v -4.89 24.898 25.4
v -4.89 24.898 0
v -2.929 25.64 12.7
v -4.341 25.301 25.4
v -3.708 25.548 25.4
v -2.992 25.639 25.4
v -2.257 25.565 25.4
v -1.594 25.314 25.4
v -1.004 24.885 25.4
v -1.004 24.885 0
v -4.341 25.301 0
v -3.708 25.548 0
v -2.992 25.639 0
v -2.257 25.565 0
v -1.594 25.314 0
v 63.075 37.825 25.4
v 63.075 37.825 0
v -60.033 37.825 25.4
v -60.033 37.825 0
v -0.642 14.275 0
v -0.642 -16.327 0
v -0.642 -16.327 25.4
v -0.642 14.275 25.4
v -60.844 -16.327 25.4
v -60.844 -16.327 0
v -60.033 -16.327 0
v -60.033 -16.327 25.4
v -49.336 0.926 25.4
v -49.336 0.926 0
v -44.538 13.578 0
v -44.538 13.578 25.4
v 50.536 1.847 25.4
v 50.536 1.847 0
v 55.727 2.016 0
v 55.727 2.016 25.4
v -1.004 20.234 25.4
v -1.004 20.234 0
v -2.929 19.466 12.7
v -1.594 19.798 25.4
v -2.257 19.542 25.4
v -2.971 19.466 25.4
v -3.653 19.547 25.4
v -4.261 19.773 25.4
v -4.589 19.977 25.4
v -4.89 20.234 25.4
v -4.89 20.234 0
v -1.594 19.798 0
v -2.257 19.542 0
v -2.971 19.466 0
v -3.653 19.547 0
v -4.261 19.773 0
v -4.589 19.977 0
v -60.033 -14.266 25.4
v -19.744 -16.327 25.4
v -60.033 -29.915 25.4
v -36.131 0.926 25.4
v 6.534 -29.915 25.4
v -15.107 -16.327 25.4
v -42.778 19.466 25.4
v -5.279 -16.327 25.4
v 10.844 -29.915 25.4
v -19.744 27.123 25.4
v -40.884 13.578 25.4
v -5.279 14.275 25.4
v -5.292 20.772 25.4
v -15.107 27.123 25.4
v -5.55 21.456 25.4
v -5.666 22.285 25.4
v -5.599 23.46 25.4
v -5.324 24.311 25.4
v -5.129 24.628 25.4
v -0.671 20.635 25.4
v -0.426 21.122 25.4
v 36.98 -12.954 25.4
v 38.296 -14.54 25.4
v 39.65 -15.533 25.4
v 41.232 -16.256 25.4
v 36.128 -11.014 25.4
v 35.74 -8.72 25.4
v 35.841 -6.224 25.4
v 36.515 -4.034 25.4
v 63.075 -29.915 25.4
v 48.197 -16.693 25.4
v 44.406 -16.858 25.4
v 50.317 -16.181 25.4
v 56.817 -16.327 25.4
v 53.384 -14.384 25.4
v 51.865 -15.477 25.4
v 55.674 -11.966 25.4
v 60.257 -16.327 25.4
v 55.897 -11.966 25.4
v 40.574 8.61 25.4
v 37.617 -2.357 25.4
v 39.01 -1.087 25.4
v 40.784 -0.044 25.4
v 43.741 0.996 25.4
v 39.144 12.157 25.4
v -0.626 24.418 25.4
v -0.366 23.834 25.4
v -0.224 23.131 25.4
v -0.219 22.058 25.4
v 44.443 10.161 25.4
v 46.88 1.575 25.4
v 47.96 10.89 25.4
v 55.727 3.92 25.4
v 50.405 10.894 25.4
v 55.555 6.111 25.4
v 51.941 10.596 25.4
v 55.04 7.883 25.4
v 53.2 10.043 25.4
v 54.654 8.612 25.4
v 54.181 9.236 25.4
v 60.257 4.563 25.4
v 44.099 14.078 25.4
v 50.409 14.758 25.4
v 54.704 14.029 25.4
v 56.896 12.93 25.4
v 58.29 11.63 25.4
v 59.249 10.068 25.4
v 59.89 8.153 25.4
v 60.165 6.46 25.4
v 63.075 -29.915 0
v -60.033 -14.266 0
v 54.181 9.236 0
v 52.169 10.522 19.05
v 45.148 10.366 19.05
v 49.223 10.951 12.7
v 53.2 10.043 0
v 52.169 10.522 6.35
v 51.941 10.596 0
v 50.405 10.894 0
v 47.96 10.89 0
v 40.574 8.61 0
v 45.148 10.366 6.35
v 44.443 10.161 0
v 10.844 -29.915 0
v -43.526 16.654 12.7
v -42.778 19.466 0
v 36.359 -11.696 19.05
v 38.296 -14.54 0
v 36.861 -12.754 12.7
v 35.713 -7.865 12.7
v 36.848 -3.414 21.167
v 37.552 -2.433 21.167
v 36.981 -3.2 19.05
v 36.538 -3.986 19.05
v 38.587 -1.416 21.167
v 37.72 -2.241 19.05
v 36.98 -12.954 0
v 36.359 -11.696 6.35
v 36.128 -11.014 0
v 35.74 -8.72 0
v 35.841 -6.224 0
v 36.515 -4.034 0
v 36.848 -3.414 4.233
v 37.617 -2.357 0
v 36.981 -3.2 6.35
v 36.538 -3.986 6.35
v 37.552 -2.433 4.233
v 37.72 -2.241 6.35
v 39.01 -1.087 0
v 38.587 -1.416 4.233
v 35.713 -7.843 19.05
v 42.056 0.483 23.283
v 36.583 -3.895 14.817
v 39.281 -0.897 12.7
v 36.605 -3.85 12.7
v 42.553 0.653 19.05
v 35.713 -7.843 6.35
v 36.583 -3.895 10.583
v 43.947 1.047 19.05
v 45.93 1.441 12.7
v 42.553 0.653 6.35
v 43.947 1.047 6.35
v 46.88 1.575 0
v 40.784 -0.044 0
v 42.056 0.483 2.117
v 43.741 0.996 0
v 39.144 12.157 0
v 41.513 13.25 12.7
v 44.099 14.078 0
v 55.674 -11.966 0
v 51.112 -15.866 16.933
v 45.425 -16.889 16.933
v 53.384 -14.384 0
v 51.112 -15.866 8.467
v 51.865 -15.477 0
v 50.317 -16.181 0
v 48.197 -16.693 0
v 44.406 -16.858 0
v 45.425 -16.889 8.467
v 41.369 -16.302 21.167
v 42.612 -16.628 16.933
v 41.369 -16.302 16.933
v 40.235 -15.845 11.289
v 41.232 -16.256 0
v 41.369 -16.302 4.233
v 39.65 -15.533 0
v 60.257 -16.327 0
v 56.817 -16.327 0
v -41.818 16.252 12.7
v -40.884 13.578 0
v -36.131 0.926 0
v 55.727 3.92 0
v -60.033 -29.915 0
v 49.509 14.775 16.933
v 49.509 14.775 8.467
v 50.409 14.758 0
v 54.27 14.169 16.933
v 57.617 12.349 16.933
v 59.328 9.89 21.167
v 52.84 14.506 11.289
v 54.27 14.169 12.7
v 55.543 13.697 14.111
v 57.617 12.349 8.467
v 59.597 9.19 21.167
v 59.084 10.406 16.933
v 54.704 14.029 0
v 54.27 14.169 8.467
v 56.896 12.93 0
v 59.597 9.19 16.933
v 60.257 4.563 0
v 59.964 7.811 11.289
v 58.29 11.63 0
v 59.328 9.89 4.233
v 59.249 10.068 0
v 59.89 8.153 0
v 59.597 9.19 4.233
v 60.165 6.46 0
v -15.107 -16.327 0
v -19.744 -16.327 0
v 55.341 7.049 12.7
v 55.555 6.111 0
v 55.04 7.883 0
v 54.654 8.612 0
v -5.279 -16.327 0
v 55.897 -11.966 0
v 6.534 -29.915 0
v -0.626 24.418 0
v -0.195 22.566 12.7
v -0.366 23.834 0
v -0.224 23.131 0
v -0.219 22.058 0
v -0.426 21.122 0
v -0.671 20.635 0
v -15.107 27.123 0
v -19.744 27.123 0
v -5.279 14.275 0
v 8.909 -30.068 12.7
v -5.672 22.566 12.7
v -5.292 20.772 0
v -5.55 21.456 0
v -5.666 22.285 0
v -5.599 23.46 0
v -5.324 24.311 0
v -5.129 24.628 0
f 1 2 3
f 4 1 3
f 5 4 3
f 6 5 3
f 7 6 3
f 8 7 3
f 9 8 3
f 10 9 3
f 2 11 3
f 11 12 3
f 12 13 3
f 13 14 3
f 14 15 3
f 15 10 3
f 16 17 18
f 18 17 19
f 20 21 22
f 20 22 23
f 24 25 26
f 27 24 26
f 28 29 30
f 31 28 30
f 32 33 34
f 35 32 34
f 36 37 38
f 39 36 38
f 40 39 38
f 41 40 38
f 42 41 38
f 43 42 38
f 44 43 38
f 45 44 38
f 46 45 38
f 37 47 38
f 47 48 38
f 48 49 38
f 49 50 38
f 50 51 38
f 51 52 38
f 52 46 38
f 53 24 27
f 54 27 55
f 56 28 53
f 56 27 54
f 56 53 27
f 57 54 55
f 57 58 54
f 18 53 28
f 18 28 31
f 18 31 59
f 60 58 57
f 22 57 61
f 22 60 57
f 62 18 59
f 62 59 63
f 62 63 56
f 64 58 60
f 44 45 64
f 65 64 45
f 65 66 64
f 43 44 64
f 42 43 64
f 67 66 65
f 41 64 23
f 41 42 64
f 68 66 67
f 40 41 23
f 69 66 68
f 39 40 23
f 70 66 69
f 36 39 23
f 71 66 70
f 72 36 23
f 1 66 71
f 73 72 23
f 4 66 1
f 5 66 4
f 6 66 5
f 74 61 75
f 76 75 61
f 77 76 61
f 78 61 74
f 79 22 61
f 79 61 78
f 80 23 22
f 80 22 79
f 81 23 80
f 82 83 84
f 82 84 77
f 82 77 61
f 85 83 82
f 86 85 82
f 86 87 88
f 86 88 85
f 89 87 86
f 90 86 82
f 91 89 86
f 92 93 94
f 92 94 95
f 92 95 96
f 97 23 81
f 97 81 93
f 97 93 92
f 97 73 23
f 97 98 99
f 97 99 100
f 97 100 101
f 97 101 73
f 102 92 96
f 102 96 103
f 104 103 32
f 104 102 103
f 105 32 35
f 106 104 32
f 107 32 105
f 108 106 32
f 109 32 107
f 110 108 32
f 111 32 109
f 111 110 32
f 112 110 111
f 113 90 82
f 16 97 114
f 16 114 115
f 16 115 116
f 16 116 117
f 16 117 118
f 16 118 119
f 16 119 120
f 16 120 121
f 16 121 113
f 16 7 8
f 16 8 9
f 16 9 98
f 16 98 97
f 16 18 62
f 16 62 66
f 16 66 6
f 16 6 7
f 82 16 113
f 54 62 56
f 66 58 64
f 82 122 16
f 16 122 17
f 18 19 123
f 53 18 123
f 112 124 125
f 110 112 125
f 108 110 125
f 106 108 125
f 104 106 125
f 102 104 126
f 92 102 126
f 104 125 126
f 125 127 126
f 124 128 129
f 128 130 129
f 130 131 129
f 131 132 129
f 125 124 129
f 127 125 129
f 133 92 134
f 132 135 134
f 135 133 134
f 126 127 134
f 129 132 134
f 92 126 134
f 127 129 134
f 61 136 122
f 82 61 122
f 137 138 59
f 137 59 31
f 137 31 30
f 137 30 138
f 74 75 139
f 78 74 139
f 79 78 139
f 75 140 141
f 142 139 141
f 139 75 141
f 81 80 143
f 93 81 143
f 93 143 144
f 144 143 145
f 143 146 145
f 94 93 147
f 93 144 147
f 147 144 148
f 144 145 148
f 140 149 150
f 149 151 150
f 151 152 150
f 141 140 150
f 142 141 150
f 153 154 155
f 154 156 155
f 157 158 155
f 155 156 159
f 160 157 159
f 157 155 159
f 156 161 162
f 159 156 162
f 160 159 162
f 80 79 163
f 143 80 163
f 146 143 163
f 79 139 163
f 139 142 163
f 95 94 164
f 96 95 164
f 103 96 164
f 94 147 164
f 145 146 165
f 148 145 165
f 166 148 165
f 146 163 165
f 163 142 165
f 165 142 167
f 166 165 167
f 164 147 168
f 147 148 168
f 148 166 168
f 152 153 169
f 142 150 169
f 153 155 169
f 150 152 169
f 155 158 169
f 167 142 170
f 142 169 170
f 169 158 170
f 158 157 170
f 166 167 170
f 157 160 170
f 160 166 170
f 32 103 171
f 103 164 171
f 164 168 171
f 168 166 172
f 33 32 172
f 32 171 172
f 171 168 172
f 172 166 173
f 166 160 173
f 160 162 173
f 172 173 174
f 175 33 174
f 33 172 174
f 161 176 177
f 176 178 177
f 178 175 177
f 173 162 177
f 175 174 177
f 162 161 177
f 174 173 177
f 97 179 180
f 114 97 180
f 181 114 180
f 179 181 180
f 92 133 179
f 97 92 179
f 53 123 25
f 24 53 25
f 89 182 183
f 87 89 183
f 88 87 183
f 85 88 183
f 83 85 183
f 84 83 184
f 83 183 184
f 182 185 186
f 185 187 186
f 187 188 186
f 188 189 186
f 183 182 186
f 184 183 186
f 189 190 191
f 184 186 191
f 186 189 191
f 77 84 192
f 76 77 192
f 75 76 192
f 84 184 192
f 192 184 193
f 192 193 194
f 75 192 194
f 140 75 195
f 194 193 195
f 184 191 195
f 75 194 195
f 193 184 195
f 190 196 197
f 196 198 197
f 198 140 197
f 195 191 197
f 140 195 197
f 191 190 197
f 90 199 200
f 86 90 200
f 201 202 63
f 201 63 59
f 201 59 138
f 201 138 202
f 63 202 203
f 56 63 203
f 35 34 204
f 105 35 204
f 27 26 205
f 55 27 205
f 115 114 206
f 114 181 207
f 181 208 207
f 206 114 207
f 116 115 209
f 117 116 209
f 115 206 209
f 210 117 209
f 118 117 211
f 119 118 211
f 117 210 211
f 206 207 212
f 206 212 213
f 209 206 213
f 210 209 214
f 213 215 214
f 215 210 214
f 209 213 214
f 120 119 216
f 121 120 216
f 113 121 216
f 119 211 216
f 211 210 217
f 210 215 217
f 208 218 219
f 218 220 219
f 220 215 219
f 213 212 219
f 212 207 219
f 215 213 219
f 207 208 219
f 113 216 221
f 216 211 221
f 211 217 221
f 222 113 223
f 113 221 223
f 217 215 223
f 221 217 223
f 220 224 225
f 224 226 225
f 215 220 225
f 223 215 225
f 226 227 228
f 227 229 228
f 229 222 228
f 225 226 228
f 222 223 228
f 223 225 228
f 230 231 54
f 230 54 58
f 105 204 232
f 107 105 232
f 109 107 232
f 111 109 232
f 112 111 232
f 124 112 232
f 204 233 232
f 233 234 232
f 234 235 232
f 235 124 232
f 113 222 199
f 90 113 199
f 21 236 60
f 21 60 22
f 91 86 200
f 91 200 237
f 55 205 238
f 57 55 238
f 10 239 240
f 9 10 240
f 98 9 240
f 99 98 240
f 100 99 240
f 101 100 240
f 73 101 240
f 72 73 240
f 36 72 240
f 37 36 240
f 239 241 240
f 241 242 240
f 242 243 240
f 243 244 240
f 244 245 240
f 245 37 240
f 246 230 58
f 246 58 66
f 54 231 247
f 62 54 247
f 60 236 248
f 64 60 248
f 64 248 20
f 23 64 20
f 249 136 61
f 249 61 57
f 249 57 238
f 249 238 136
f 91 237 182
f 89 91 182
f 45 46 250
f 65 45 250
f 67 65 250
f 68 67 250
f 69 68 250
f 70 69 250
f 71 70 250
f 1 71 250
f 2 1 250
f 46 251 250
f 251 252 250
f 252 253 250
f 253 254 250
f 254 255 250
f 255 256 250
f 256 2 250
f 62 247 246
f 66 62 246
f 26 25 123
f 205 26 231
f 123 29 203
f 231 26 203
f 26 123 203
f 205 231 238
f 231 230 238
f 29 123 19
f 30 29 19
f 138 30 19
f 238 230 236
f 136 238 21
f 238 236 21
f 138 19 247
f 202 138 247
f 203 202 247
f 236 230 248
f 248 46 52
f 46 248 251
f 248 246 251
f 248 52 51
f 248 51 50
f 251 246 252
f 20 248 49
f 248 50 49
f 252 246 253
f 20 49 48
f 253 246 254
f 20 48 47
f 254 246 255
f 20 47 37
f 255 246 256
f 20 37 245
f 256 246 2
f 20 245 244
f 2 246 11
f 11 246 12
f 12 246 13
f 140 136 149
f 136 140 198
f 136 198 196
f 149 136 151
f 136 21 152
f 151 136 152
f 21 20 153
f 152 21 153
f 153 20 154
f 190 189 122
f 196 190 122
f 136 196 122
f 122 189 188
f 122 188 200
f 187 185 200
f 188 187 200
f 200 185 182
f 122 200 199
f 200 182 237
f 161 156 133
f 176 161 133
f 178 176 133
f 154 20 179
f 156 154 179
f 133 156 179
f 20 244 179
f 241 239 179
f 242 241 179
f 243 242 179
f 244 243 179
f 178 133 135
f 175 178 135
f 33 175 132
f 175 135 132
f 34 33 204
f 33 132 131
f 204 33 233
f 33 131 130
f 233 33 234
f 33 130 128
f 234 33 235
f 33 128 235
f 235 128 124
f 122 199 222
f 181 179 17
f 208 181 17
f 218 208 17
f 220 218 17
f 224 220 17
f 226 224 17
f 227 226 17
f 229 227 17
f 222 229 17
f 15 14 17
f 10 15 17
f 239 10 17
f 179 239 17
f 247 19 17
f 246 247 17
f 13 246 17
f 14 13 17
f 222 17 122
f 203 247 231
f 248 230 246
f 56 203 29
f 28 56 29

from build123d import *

# Parameters (mm, degrees)
F0_W     = 4.6371185902
F0_H     = 30.6014088084
F0_H_2   = 43.4495331489
F1_DEPTH = 25.4


with BuildPart() as f1:
    # F0 (on Top) → F1 (new body)
    with BuildSketch(Plane.XY):
        with BuildLine():
            Line((63.0750581622, 37.8247536719), (-60.0328557193, 37.8247536719))
            Line((-60.0328557193, 37.8247536719), (-60.0328557193, -14.2655899338))
            Line((-60.0328557193, -14.2655899338), (-44.7080042092, 24.6659818982))
            Line((-44.7080042092, 24.6659818982), (-40.7141853078, 24.6659818982))
            Line((-40.7141853078, 24.6659818982), (-24.658497241, -16.3265038282))
            Line((-24.658497241, -16.3265038282), (-29.5725920862, -16.3265038282))
            Line((-29.5725920862, -16.3265038282), (-34.6564465714, -3.3443587191))
            Line((-34.6564465714, -3.3443587191), (-51.0159150468, -3.3443587191))
            Line((-51.0159150468, -3.3443587191), (-56.0372265067, -16.3265038282))
            Line((-56.0372265067, -16.3265038282), (-60.0328557193, -16.3265038282))
            Line((-60.0328557193, -16.3265038282), (-60.0328557193, -29.9150198698))
            Line((-60.0328557193, -29.9150198698), (6.5335062061, -29.9150198698))
            add(Edge.make_bspline(
                [(6.5335062061, -29.9150198698), (5.6202163906, -29.7963329994), (4.718855215, -29.5856251921)],
                knots=[0.5632770419, 0.5632770419, 0.5632770419, 1, 1, 1], degree=2))
            Line((4.718855215, -29.5856251921), (4.718855215, -25.8777172635))
            add(Edge.make_bspline(
                [(4.718855215, -25.8777172635), (6.2556266938, -26.2083018258), (8.1497868887, -26.2083018258)],
                knots=[0, 0, 0, 1, 1, 1], degree=2))
            add(Edge.make_bspline(
                [(8.1497868887, -26.2083018258), (12.9298609653, -26.2083018258), (14.9669766466, -20.8474710857)],
                knots=[0, 0, 0, 1, 1, 1], degree=2))
            Line((14.9669766466, -20.8474710857), (16.6735077655, -16.4962634683))
            Line((16.6735077655, -16.4962634683), (4.3257276274, 14.2749049802))
            Line((4.3257276274, 14.2749049802), (9.3023654978, 14.2749049802))
            Line((9.3023654978, 14.2749049802), (16.003403923, -3.174599079))
            add(Edge.make_bspline(
                [(16.003403923, -3.174599079), (18.2013445265, -9.1519253543), (18.7374276005, -11.8055365706)],
                knots=[0, 0, 0, 1, 1, 1], degree=2))
            Line((18.7374276005, -11.8055365706), (18.960795548, -11.8055365706))
            add(Edge.make_bspline(
                [(18.960795548, -11.8055365706), (19.318184264, -10.3759817066), (20.479697591, -6.9271805971)],
                knots=[0, 0, 0, 1, 1, 1], degree=2))
            add(Edge.make_bspline(
                [(20.479697591, -6.9271805971), (21.6412109181, -3.4783794876), (28.0652730883, 14.2749049802)],
                knots=[0, 0, 0, 1, 1, 1], degree=2))
            Line((28.0652730883, 14.2749049802), (33.0329762409, 14.2749049802))
            Line((33.0329762409, 14.2749049802), (19.8810714917, -20.5704948308))
            add(Edge.make_bspline(
                [(19.8810714917, -20.5704948308), (17.9243682716, -25.7347617771), (15.3154306447, -27.9014308679)],
                knots=[0, 0, 0, 1, 1, 1], degree=2))
            add(Edge.make_bspline(
                [(15.3154306447, -27.9014308679), (13.3999615447, -29.4921885965), (10.8439389661, -29.9150198698)],
                knots=[0, 0, 0, 0.7341950533, 0.7341950533, 0.7341950533], degree=2))
            Line((10.8439389661, -29.9150198698), (63.0750581622, -29.9150198698))
            Line((63.0750581622, -29.9150198698), (63.0750581622, 37.8247536719))
        make_face()
        with Locations((-2.9605348203, -1.025799424)):
            Rectangle(F0_W, F0_H, mode=Mode.SUBTRACT)
        with BuildLine():
            Line((60.2570616829, -16.3265038282), (56.8171952913, -16.3265038282))
            Line((56.8171952913, -16.3265038282), (55.8969193476, -11.9663614928))
            Line((55.8969193476, -11.9663614928), (55.6735514001, -11.9663614928))
            add(Edge.make_bspline(
                [(55.6735514001, -11.9663614928), (53.3862636176, -14.8433406567), (51.112377912, -15.8663658563)],
                knots=[0, 0, 0, 1, 1, 1], degree=2))
            add(Edge.make_bspline(
                [(51.112377912, -15.8663658563), (48.8384922064, -16.8893910559), (45.4254299685, -16.8893910559)],
                knots=[0, 0, 0, 1, 1, 1], degree=2))
            add(Edge.make_bspline(
                [(45.4254299685, -16.8893910559), (40.8776585573, -16.8893910559), (38.2955250841, -14.5395602481)],
                knots=[0, 0, 0, 1, 1, 1], degree=2))
            add(Edge.make_bspline(
                [(38.2955250841, -14.5395602481), (35.7133916109, -12.1897294404), (35.7133916109, -7.8653259766)],
                knots=[0, 0, 0, 1, 1, 1], degree=2))
            add(Edge.make_bspline(
                [(35.7133916109, -7.8653259766), (35.7133916109, 1.3999764859), (50.5360886075, 1.8467123809)],
                knots=[0, 0, 0, 1, 1, 1], degree=2))
            Line((50.5360886075, 1.8467123809), (55.7271597075, 2.016472021))
            Line((55.7271597075, 2.016472021), (55.7271597075, 3.9195669338))
            add(Edge.make_bspline(
                [(55.7271597075, 3.9195669338), (55.7271597075, 7.5202582476), (54.1814535108, 9.2357240844)],
                knots=[0, 0, 0, 1, 1, 1], degree=2))
            add(Edge.make_bspline(
                [(54.1814535108, 9.2357240844), (52.635747314, 10.9511899213), (49.2226850761, 10.9511899213)],
                knots=[0, 0, 0, 1, 1, 1], degree=2))
            add(Edge.make_bspline(
                [(49.2226850761, 10.9511899213), (45.3986258148, 10.9511899213), (40.5738781487, 8.6102938314)],
                knots=[0, 0, 0, 1, 1, 1], degree=2))
            Line((40.5738781487, 8.6102938314), (39.1443232846, 12.1573768378))
            add(Edge.make_bspline(
                [(39.1443232846, 12.1573768378), (41.4048069134, 13.3814331902), (44.0986243603, 14.0783411864)],
                knots=[0, 0, 0, 1, 1, 1], degree=2))
            add(Edge.make_bspline(
                [(44.0986243603, 14.0783411864), (46.7924418073, 14.7752491826), (49.5085960489, 14.7752491826)],
                knots=[0, 0, 0, 1, 1, 1], degree=2))
            add(Edge.make_bspline(
                [(49.5085960489, 14.7752491826), (54.9766434039, 14.7752491826), (57.6168525434, 12.3494732727)],
                knots=[0, 0, 0, 1, 1, 1], degree=2))
            add(Edge.make_bspline(
                [(57.6168525434, 12.3494732727), (60.2570616829, 9.9236973628), (60.2570616829, 4.5628666226)],
                knots=[0, 0, 0, 1, 1, 1], degree=2))
            Line((60.2570616829, 4.5628666226), (60.2570616829, -16.3265038282))
        make_face(mode=Mode.SUBTRACT)
        with Locations((-17.4258431008, 5.3982627463)):
            Rectangle(F0_W, F0_H_2, mode=Mode.SUBTRACT)
        with BuildLine():
            add(Edge.make_bspline(
                [(-4.8904338867, 20.2343618197), (-5.672221703, 21.0027475591), (-5.672221703, 22.5663231916)],
                knots=[0, 0, 0, 1, 1, 1], degree=2))
            add(Edge.make_bspline(
                [(-5.672221703, 22.5663231916), (-5.672221703, 24.1567029779), (-4.8904338867, 24.8982845636)],
                knots=[0, 0, 0, 1, 1, 1], degree=2))
            add(Edge.make_bspline(
                [(-4.8904338867, 24.8982845636), (-4.1086460705, 25.6398661493), (-2.9292633076, 25.6398661493)],
                knots=[0, 0, 0, 1, 1, 1], degree=2))
            add(Edge.make_bspline(
                [(-2.9292633076, 25.6398661493), (-1.8124235701, 25.6398661493), (-1.0038316001, 24.8848824867)],
                knots=[0, 0, 0, 1, 1, 1], degree=2))
            add(Edge.make_bspline(
                [(-1.0038316001, 24.8848824867), (-0.1952396302, 24.1298988242), (-0.1952396302, 22.5663231916)],
                knots=[0, 0, 0, 1, 1, 1], degree=2))
            add(Edge.make_bspline(
                [(-0.1952396302, 22.5663231916), (-0.1952396302, 21.0027475591), (-1.0038316001, 20.2343618197)],
                knots=[0, 0, 0, 1, 1, 1], degree=2))
            add(Edge.make_bspline(
                [(-1.0038316001, 20.2343618197), (-1.8124235701, 19.4659760802), (-2.9292633076, 19.4659760802)],
                knots=[0, 0, 0, 1, 1, 1], degree=2))
            add(Edge.make_bspline(
                [(-2.9292633076, 19.4659760802), (-4.1086460705, 19.4659760802), (-4.8904338867, 20.2343618197)],
                knots=[0, 0, 0, 1, 1, 1], degree=2))
        make_face(mode=Mode.SUBTRACT)
        Polygon((-44.7080042092, 24.6659818982), (-60.0328557193, -14.2655899338), (-60.0328557193, -16.3265038282), (-56.0372265067, -16.3265038282), (-51.0159150468, -3.3443587191), (-34.6564465714, -3.3443587191), (-29.5725920862, -16.3265038282), (-24.658497241, -16.3265038282), (-40.7141853078, 24.6659818982), align=None)
        with BuildLine():
            Line((-40.8839449479, 13.577996984), (-36.130675025, 0.9264364372))
            Line((-36.130675025, 0.9264364372), (-49.3361880815, 0.9264364372))
            Line((-49.3361880815, 0.9264364372), (-44.5382445691, 13.577996984))
            add(Edge.make_bspline(
                [(-42.7781051427, 19.4659760802), (-43.3946006779, 16.7855607102), (-44.5382445691, 13.577996984)],
                knots=[0, 0, 0, 1, 1, 1], degree=2))
            add(Edge.make_bspline(
                [(-40.8839449479, 13.577996984), (-41.8042208916, 15.9814360991), (-42.7781051427, 19.4659760802)],
                knots=[0, 0, 0, 1, 1, 1], degree=2))
        make_face(mode=Mode.SUBTRACT)
        Polygon((-60.0328557193, -16.3265038282), (-60.0328557193, -14.2655899338), (-60.844104737, -16.3265038282), align=None)
        with BuildLine():
            add(Edge.make_bspline(
                [(10.8439389661, -29.9150198698), (9.9185671017, -30.0680999588), (8.9092379102, -30.0680999588)],
                knots=[0.7341950533, 0.7341950533, 0.7341950533, 1, 1, 1], degree=2))
            Line((10.8439389661, -29.9150198698), (6.5335062061, -29.9150198698))
            add(Edge.make_bspline(
                [(8.9092379102, -30.0680999588), (7.7114502005, -30.0680999588), (6.5335062061, -29.9150198698)],
                knots=[0, 0, 0, 0.5632770419, 0.5632770419, 0.5632770419], degree=2))
        make_face()
        with BuildLine():
            Line((6.5335062061, -29.9150198698), (10.8439389661, -29.9150198698))
            add(Edge.make_bspline(
                [(15.3154306447, -27.9014308679), (13.3999615447, -29.4921885965), (10.8439389661, -29.9150198698)],
                knots=[0, 0, 0, 0.7341950533, 0.7341950533, 0.7341950533], degree=2))
            add(Edge.make_bspline(
                [(19.8810714917, -20.5704948308), (17.9243682716, -25.7347617771), (15.3154306447, -27.9014308679)],
                knots=[0, 0, 0, 1, 1, 1], degree=2))
            Line((19.8810714917, -20.5704948308), (33.0329762409, 14.2749049802))
            Line((33.0329762409, 14.2749049802), (28.0652730883, 14.2749049802))
            add(Edge.make_bspline(
                [(20.479697591, -6.9271805971), (21.6412109181, -3.4783794876), (28.0652730883, 14.2749049802)],
                knots=[0, 0, 0, 1, 1, 1], degree=2))
            add(Edge.make_bspline(
                [(18.960795548, -11.8055365706), (19.318184264, -10.3759817066), (20.479697591, -6.9271805971)],
                knots=[0, 0, 0, 1, 1, 1], degree=2))
            Line((18.960795548, -11.8055365706), (18.7374276005, -11.8055365706))
            add(Edge.make_bspline(
                [(16.003403923, -3.174599079), (18.2013445265, -9.1519253543), (18.7374276005, -11.8055365706)],
                knots=[0, 0, 0, 1, 1, 1], degree=2))
            Line((16.003403923, -3.174599079), (9.3023654978, 14.2749049802))
            Line((9.3023654978, 14.2749049802), (4.3257276274, 14.2749049802))
            Line((4.3257276274, 14.2749049802), (16.6735077655, -16.4962634683))
            Line((16.6735077655, -16.4962634683), (14.9669766466, -20.8474710857))
            add(Edge.make_bspline(
                [(8.1497868887, -26.2083018258), (12.9298609653, -26.2083018258), (14.9669766466, -20.8474710857)],
                knots=[0, 0, 0, 1, 1, 1], degree=2))
            add(Edge.make_bspline(
                [(4.718855215, -25.8777172635), (6.2556266938, -26.2083018258), (8.1497868887, -26.2083018258)],
                knots=[0, 0, 0, 1, 1, 1], degree=2))
            Line((4.718855215, -25.8777172635), (4.718855215, -29.5856251921))
            add(Edge.make_bspline(
                [(6.5335062061, -29.9150198698), (5.6202163906, -29.7963329994), (4.718855215, -29.5856251921)],
                knots=[0.5632770419, 0.5632770419, 0.5632770419, 1, 1, 1], degree=2))
        make_face()
    extrude(amount=F1_DEPTH)


solid = f1.part
